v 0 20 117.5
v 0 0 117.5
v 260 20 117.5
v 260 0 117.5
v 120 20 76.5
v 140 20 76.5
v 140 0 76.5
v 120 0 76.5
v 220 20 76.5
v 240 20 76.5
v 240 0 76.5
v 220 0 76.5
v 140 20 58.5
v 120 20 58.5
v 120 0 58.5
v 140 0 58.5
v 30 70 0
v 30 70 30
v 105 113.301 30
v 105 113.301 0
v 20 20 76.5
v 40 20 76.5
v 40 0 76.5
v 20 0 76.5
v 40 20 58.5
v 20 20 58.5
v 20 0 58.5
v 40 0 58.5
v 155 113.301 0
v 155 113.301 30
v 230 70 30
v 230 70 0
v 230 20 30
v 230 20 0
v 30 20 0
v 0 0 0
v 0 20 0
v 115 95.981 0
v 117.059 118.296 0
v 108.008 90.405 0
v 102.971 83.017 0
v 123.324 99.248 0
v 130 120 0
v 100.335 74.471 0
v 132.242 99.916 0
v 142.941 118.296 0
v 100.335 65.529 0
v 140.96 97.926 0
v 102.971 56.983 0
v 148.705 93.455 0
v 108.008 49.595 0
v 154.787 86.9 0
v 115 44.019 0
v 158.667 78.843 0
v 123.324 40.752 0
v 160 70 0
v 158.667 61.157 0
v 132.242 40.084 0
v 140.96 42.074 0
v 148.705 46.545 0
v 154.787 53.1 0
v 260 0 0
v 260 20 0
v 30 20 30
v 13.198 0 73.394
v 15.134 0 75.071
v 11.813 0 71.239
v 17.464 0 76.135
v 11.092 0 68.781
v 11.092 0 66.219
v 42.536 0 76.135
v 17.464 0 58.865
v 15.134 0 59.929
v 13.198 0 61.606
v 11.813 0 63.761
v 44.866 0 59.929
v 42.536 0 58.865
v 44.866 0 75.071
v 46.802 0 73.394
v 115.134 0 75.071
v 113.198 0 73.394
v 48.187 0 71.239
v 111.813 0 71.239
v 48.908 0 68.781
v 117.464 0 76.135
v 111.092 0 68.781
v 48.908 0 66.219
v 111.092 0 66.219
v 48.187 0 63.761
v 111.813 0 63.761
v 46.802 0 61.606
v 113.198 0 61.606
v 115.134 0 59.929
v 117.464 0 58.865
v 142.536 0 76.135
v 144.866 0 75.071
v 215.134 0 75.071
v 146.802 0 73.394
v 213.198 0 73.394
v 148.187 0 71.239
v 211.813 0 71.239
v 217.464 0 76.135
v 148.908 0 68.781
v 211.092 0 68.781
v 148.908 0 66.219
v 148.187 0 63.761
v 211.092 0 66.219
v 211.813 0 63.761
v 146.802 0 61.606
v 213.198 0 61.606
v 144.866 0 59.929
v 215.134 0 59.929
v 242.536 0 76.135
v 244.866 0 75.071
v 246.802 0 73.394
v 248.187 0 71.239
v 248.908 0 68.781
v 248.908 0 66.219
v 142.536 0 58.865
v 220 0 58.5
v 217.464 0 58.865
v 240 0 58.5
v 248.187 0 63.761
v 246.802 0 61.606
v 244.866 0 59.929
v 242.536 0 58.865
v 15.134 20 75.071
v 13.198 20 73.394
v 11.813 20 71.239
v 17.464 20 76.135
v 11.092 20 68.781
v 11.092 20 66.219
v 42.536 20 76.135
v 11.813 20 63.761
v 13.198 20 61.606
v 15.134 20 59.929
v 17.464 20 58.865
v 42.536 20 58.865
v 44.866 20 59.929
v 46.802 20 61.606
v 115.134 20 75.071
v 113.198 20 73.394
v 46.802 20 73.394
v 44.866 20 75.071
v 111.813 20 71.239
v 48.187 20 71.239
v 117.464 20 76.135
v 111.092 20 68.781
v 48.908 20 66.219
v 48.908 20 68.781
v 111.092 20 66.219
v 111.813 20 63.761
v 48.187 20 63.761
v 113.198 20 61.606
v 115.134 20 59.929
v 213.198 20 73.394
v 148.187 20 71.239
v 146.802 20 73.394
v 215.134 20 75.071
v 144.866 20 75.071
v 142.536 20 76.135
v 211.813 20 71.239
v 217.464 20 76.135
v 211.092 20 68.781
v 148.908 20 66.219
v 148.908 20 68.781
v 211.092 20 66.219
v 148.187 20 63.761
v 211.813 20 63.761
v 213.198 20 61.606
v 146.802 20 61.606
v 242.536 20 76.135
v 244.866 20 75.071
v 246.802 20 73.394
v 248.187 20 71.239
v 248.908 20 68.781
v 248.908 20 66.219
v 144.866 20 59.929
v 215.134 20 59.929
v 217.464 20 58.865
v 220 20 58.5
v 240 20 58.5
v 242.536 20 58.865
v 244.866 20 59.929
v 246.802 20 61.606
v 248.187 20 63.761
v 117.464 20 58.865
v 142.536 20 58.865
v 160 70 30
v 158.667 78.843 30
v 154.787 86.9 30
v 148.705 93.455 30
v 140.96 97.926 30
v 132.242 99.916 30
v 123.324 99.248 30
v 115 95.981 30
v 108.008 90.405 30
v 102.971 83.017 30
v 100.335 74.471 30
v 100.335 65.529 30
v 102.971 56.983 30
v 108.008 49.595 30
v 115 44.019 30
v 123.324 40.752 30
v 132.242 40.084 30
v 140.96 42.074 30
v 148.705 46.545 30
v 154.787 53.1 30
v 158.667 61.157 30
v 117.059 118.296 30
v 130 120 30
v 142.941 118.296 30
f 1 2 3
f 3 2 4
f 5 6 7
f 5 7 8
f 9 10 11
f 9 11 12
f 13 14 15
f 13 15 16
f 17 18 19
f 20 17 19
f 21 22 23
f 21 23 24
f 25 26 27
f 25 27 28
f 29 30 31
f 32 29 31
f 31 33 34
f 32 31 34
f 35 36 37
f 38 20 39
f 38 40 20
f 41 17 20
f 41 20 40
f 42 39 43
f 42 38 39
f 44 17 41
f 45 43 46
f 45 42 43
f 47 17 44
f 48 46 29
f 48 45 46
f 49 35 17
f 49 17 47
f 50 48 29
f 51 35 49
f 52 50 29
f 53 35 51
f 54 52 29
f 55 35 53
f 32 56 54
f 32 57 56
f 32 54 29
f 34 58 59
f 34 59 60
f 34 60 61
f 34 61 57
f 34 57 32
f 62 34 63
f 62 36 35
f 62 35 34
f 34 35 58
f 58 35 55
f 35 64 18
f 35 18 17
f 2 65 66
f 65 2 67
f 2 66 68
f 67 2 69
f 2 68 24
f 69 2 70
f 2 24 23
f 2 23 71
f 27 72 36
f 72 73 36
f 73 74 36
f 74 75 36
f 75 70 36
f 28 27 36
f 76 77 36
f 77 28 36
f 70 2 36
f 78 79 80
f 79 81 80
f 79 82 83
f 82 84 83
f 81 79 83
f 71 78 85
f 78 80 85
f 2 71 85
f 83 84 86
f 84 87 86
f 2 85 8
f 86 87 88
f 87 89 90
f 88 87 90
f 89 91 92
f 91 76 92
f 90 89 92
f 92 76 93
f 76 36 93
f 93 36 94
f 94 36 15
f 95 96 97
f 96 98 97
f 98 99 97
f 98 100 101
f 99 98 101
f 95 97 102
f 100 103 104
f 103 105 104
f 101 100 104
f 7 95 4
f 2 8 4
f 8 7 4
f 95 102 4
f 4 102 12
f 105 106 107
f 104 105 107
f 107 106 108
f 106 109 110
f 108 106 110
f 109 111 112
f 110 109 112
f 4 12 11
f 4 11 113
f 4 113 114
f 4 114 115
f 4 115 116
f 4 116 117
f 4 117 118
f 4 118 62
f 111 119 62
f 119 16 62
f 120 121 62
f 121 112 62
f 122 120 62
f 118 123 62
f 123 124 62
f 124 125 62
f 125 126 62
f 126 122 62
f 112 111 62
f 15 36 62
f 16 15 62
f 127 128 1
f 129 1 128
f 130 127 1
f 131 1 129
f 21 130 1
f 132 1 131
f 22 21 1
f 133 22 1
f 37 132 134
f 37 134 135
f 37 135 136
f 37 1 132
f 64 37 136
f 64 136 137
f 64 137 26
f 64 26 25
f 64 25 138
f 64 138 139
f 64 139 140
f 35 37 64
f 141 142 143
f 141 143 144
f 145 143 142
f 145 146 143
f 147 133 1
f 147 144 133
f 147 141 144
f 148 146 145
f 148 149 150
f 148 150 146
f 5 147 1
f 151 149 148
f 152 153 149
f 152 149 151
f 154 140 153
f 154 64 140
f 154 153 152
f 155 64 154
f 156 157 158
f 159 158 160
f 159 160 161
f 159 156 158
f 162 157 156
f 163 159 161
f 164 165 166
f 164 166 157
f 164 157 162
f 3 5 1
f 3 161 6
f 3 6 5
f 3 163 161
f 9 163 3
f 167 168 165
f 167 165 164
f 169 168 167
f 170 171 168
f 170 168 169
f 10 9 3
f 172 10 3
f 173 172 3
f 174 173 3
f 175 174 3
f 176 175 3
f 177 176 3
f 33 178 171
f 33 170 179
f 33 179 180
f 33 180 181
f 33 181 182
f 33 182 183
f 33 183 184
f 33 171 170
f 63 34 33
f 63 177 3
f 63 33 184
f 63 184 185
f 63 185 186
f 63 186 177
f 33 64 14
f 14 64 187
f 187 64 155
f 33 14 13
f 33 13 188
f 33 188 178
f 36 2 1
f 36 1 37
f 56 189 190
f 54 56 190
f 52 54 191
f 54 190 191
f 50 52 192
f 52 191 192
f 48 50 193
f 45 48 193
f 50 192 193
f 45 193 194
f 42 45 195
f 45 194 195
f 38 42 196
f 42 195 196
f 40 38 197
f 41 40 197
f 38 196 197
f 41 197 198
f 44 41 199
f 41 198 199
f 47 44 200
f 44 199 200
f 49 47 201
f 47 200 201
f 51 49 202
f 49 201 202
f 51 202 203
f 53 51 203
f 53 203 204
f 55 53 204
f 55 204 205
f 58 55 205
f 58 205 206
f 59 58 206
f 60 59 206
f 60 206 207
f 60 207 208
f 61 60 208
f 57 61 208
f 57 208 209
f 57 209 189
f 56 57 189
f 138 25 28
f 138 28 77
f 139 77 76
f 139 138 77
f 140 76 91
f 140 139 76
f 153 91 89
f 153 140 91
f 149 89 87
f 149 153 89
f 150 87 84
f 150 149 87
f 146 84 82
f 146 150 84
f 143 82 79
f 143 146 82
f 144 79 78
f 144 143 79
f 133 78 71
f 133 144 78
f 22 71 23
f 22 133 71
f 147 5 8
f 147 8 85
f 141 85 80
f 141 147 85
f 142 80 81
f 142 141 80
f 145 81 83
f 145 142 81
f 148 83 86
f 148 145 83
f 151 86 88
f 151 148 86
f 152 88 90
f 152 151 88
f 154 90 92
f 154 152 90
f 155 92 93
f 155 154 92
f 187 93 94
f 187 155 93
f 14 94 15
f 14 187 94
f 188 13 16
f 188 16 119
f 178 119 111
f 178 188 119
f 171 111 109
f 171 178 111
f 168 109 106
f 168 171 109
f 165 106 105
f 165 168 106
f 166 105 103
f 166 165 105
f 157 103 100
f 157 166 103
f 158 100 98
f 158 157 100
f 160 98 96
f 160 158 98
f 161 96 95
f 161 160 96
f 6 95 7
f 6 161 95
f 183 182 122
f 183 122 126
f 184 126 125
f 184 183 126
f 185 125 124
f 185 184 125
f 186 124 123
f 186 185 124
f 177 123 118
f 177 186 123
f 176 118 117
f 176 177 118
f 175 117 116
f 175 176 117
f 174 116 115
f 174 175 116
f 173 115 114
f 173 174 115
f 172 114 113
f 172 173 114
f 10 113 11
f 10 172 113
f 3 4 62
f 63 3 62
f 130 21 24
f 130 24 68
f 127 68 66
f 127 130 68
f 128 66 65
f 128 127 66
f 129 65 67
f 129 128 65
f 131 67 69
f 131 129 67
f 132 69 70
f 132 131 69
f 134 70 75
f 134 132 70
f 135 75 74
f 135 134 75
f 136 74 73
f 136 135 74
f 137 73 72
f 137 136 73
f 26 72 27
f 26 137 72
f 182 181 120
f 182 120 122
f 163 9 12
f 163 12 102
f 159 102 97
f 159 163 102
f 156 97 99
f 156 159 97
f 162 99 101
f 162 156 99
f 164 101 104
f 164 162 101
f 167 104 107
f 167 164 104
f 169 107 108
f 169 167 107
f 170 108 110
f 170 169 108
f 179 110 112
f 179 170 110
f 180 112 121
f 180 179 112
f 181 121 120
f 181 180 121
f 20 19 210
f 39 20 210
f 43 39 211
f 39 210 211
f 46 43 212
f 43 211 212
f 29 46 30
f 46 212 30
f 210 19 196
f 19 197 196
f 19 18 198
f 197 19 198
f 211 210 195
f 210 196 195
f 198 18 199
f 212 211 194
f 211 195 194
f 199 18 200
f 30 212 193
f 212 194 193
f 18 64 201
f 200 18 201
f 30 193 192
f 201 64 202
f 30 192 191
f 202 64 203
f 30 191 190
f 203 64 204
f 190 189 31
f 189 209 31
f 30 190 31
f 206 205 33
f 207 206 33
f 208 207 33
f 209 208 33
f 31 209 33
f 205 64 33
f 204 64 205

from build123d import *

# Parameters (mm, degrees)
SKETCH_2_W             = 260
SKETCH_2_H             = 117.5
EXTRUDE_1_DEPTH        = 20
CUT_EXTRUDE_1_DEPTH    = 287.017919019
PATTERN_LINEAR_1_COUNT = 3
PATTERN_LINEAR_1_PITCH = 100
SKETCH_4_W             = 200
SKETCH_4_H             = 30
EXTRUDE_2_DEPTH        = 100
SKETCH_5_R             = 30
CUT_EXTRUDE_2_DEPTH    = 300.42653523


with BuildPart() as part:
    # 草图2 → 凸台-拉伸1 (new body)
    with BuildSketch(Plane(origin=(0, 0, 0), x_dir=(1, 0, 0), z_dir=(0, 1, 0))):
        with Locations((130, -58.75)):
            Rectangle(SKETCH_2_W, SKETCH_2_H)
    extrude(amount=EXTRUDE_1_DEPTH)

    # 草图3 → 切除-拉伸1 (cut, through all)
    with BuildSketch(Plane(origin=(0, 20, 0), x_dir=(1, 0, 0), z_dir=(0, 1, 0))):
        with BuildLine():
            Line((20, -58.5), (40, -58.5))
            ThreePointArc((40, -58.5), (49, -67.5), (40, -76.5))
            Line((40, -76.5), (20, -76.5))
            ThreePointArc((20, -76.5), (11, -67.5), (20, -58.5))
        make_face()
    cut_extrude_1 = extrude(amount=-CUT_EXTRUDE_1_DEPTH, mode=Mode.SUBTRACT)

    # 阵列(线性)1: 切除-拉伸1 ×3
    with Locations(*[(i * PATTERN_LINEAR_1_PITCH, 0, 0) for i in range(1, PATTERN_LINEAR_1_COUNT)]):
        add(cut_extrude_1, mode=Mode.SUBTRACT)

    # 草图4 → 凸台-拉伸2 (add)
    with BuildSketch(Plane(origin=(0, 20, 0), x_dir=(1, 0, 0), z_dir=(0, 1, 0))):
        with Locations((130, -15)):
            Rectangle(SKETCH_4_W, SKETCH_4_H)
    extrude(amount=EXTRUDE_2_DEPTH)

    # 草图5 → 切除-拉伸2 (cut, through all)
    with BuildSketch(Plane.XY.offset(30)):
        with Locations((130, 70)):
            Circle(SKETCH_5_R)
        with BuildLine():
            Line((30, 70), (105, 113.301270189))
            ThreePointArc((105, 113.301270189), (130, 120), (155, 113.301270189))
            Line((155, 113.301270189), (230, 70))
            Line((230, 70), (230, 137.29910678))
            Line((230, 137.29910678), (30, 137.29910678))
            Line((30, 137.29910678), (30, 70))
        make_face()
    extrude(amount=-CUT_EXTRUDE_2_DEPTH, mode=Mode.SUBTRACT)


solid = part.part
